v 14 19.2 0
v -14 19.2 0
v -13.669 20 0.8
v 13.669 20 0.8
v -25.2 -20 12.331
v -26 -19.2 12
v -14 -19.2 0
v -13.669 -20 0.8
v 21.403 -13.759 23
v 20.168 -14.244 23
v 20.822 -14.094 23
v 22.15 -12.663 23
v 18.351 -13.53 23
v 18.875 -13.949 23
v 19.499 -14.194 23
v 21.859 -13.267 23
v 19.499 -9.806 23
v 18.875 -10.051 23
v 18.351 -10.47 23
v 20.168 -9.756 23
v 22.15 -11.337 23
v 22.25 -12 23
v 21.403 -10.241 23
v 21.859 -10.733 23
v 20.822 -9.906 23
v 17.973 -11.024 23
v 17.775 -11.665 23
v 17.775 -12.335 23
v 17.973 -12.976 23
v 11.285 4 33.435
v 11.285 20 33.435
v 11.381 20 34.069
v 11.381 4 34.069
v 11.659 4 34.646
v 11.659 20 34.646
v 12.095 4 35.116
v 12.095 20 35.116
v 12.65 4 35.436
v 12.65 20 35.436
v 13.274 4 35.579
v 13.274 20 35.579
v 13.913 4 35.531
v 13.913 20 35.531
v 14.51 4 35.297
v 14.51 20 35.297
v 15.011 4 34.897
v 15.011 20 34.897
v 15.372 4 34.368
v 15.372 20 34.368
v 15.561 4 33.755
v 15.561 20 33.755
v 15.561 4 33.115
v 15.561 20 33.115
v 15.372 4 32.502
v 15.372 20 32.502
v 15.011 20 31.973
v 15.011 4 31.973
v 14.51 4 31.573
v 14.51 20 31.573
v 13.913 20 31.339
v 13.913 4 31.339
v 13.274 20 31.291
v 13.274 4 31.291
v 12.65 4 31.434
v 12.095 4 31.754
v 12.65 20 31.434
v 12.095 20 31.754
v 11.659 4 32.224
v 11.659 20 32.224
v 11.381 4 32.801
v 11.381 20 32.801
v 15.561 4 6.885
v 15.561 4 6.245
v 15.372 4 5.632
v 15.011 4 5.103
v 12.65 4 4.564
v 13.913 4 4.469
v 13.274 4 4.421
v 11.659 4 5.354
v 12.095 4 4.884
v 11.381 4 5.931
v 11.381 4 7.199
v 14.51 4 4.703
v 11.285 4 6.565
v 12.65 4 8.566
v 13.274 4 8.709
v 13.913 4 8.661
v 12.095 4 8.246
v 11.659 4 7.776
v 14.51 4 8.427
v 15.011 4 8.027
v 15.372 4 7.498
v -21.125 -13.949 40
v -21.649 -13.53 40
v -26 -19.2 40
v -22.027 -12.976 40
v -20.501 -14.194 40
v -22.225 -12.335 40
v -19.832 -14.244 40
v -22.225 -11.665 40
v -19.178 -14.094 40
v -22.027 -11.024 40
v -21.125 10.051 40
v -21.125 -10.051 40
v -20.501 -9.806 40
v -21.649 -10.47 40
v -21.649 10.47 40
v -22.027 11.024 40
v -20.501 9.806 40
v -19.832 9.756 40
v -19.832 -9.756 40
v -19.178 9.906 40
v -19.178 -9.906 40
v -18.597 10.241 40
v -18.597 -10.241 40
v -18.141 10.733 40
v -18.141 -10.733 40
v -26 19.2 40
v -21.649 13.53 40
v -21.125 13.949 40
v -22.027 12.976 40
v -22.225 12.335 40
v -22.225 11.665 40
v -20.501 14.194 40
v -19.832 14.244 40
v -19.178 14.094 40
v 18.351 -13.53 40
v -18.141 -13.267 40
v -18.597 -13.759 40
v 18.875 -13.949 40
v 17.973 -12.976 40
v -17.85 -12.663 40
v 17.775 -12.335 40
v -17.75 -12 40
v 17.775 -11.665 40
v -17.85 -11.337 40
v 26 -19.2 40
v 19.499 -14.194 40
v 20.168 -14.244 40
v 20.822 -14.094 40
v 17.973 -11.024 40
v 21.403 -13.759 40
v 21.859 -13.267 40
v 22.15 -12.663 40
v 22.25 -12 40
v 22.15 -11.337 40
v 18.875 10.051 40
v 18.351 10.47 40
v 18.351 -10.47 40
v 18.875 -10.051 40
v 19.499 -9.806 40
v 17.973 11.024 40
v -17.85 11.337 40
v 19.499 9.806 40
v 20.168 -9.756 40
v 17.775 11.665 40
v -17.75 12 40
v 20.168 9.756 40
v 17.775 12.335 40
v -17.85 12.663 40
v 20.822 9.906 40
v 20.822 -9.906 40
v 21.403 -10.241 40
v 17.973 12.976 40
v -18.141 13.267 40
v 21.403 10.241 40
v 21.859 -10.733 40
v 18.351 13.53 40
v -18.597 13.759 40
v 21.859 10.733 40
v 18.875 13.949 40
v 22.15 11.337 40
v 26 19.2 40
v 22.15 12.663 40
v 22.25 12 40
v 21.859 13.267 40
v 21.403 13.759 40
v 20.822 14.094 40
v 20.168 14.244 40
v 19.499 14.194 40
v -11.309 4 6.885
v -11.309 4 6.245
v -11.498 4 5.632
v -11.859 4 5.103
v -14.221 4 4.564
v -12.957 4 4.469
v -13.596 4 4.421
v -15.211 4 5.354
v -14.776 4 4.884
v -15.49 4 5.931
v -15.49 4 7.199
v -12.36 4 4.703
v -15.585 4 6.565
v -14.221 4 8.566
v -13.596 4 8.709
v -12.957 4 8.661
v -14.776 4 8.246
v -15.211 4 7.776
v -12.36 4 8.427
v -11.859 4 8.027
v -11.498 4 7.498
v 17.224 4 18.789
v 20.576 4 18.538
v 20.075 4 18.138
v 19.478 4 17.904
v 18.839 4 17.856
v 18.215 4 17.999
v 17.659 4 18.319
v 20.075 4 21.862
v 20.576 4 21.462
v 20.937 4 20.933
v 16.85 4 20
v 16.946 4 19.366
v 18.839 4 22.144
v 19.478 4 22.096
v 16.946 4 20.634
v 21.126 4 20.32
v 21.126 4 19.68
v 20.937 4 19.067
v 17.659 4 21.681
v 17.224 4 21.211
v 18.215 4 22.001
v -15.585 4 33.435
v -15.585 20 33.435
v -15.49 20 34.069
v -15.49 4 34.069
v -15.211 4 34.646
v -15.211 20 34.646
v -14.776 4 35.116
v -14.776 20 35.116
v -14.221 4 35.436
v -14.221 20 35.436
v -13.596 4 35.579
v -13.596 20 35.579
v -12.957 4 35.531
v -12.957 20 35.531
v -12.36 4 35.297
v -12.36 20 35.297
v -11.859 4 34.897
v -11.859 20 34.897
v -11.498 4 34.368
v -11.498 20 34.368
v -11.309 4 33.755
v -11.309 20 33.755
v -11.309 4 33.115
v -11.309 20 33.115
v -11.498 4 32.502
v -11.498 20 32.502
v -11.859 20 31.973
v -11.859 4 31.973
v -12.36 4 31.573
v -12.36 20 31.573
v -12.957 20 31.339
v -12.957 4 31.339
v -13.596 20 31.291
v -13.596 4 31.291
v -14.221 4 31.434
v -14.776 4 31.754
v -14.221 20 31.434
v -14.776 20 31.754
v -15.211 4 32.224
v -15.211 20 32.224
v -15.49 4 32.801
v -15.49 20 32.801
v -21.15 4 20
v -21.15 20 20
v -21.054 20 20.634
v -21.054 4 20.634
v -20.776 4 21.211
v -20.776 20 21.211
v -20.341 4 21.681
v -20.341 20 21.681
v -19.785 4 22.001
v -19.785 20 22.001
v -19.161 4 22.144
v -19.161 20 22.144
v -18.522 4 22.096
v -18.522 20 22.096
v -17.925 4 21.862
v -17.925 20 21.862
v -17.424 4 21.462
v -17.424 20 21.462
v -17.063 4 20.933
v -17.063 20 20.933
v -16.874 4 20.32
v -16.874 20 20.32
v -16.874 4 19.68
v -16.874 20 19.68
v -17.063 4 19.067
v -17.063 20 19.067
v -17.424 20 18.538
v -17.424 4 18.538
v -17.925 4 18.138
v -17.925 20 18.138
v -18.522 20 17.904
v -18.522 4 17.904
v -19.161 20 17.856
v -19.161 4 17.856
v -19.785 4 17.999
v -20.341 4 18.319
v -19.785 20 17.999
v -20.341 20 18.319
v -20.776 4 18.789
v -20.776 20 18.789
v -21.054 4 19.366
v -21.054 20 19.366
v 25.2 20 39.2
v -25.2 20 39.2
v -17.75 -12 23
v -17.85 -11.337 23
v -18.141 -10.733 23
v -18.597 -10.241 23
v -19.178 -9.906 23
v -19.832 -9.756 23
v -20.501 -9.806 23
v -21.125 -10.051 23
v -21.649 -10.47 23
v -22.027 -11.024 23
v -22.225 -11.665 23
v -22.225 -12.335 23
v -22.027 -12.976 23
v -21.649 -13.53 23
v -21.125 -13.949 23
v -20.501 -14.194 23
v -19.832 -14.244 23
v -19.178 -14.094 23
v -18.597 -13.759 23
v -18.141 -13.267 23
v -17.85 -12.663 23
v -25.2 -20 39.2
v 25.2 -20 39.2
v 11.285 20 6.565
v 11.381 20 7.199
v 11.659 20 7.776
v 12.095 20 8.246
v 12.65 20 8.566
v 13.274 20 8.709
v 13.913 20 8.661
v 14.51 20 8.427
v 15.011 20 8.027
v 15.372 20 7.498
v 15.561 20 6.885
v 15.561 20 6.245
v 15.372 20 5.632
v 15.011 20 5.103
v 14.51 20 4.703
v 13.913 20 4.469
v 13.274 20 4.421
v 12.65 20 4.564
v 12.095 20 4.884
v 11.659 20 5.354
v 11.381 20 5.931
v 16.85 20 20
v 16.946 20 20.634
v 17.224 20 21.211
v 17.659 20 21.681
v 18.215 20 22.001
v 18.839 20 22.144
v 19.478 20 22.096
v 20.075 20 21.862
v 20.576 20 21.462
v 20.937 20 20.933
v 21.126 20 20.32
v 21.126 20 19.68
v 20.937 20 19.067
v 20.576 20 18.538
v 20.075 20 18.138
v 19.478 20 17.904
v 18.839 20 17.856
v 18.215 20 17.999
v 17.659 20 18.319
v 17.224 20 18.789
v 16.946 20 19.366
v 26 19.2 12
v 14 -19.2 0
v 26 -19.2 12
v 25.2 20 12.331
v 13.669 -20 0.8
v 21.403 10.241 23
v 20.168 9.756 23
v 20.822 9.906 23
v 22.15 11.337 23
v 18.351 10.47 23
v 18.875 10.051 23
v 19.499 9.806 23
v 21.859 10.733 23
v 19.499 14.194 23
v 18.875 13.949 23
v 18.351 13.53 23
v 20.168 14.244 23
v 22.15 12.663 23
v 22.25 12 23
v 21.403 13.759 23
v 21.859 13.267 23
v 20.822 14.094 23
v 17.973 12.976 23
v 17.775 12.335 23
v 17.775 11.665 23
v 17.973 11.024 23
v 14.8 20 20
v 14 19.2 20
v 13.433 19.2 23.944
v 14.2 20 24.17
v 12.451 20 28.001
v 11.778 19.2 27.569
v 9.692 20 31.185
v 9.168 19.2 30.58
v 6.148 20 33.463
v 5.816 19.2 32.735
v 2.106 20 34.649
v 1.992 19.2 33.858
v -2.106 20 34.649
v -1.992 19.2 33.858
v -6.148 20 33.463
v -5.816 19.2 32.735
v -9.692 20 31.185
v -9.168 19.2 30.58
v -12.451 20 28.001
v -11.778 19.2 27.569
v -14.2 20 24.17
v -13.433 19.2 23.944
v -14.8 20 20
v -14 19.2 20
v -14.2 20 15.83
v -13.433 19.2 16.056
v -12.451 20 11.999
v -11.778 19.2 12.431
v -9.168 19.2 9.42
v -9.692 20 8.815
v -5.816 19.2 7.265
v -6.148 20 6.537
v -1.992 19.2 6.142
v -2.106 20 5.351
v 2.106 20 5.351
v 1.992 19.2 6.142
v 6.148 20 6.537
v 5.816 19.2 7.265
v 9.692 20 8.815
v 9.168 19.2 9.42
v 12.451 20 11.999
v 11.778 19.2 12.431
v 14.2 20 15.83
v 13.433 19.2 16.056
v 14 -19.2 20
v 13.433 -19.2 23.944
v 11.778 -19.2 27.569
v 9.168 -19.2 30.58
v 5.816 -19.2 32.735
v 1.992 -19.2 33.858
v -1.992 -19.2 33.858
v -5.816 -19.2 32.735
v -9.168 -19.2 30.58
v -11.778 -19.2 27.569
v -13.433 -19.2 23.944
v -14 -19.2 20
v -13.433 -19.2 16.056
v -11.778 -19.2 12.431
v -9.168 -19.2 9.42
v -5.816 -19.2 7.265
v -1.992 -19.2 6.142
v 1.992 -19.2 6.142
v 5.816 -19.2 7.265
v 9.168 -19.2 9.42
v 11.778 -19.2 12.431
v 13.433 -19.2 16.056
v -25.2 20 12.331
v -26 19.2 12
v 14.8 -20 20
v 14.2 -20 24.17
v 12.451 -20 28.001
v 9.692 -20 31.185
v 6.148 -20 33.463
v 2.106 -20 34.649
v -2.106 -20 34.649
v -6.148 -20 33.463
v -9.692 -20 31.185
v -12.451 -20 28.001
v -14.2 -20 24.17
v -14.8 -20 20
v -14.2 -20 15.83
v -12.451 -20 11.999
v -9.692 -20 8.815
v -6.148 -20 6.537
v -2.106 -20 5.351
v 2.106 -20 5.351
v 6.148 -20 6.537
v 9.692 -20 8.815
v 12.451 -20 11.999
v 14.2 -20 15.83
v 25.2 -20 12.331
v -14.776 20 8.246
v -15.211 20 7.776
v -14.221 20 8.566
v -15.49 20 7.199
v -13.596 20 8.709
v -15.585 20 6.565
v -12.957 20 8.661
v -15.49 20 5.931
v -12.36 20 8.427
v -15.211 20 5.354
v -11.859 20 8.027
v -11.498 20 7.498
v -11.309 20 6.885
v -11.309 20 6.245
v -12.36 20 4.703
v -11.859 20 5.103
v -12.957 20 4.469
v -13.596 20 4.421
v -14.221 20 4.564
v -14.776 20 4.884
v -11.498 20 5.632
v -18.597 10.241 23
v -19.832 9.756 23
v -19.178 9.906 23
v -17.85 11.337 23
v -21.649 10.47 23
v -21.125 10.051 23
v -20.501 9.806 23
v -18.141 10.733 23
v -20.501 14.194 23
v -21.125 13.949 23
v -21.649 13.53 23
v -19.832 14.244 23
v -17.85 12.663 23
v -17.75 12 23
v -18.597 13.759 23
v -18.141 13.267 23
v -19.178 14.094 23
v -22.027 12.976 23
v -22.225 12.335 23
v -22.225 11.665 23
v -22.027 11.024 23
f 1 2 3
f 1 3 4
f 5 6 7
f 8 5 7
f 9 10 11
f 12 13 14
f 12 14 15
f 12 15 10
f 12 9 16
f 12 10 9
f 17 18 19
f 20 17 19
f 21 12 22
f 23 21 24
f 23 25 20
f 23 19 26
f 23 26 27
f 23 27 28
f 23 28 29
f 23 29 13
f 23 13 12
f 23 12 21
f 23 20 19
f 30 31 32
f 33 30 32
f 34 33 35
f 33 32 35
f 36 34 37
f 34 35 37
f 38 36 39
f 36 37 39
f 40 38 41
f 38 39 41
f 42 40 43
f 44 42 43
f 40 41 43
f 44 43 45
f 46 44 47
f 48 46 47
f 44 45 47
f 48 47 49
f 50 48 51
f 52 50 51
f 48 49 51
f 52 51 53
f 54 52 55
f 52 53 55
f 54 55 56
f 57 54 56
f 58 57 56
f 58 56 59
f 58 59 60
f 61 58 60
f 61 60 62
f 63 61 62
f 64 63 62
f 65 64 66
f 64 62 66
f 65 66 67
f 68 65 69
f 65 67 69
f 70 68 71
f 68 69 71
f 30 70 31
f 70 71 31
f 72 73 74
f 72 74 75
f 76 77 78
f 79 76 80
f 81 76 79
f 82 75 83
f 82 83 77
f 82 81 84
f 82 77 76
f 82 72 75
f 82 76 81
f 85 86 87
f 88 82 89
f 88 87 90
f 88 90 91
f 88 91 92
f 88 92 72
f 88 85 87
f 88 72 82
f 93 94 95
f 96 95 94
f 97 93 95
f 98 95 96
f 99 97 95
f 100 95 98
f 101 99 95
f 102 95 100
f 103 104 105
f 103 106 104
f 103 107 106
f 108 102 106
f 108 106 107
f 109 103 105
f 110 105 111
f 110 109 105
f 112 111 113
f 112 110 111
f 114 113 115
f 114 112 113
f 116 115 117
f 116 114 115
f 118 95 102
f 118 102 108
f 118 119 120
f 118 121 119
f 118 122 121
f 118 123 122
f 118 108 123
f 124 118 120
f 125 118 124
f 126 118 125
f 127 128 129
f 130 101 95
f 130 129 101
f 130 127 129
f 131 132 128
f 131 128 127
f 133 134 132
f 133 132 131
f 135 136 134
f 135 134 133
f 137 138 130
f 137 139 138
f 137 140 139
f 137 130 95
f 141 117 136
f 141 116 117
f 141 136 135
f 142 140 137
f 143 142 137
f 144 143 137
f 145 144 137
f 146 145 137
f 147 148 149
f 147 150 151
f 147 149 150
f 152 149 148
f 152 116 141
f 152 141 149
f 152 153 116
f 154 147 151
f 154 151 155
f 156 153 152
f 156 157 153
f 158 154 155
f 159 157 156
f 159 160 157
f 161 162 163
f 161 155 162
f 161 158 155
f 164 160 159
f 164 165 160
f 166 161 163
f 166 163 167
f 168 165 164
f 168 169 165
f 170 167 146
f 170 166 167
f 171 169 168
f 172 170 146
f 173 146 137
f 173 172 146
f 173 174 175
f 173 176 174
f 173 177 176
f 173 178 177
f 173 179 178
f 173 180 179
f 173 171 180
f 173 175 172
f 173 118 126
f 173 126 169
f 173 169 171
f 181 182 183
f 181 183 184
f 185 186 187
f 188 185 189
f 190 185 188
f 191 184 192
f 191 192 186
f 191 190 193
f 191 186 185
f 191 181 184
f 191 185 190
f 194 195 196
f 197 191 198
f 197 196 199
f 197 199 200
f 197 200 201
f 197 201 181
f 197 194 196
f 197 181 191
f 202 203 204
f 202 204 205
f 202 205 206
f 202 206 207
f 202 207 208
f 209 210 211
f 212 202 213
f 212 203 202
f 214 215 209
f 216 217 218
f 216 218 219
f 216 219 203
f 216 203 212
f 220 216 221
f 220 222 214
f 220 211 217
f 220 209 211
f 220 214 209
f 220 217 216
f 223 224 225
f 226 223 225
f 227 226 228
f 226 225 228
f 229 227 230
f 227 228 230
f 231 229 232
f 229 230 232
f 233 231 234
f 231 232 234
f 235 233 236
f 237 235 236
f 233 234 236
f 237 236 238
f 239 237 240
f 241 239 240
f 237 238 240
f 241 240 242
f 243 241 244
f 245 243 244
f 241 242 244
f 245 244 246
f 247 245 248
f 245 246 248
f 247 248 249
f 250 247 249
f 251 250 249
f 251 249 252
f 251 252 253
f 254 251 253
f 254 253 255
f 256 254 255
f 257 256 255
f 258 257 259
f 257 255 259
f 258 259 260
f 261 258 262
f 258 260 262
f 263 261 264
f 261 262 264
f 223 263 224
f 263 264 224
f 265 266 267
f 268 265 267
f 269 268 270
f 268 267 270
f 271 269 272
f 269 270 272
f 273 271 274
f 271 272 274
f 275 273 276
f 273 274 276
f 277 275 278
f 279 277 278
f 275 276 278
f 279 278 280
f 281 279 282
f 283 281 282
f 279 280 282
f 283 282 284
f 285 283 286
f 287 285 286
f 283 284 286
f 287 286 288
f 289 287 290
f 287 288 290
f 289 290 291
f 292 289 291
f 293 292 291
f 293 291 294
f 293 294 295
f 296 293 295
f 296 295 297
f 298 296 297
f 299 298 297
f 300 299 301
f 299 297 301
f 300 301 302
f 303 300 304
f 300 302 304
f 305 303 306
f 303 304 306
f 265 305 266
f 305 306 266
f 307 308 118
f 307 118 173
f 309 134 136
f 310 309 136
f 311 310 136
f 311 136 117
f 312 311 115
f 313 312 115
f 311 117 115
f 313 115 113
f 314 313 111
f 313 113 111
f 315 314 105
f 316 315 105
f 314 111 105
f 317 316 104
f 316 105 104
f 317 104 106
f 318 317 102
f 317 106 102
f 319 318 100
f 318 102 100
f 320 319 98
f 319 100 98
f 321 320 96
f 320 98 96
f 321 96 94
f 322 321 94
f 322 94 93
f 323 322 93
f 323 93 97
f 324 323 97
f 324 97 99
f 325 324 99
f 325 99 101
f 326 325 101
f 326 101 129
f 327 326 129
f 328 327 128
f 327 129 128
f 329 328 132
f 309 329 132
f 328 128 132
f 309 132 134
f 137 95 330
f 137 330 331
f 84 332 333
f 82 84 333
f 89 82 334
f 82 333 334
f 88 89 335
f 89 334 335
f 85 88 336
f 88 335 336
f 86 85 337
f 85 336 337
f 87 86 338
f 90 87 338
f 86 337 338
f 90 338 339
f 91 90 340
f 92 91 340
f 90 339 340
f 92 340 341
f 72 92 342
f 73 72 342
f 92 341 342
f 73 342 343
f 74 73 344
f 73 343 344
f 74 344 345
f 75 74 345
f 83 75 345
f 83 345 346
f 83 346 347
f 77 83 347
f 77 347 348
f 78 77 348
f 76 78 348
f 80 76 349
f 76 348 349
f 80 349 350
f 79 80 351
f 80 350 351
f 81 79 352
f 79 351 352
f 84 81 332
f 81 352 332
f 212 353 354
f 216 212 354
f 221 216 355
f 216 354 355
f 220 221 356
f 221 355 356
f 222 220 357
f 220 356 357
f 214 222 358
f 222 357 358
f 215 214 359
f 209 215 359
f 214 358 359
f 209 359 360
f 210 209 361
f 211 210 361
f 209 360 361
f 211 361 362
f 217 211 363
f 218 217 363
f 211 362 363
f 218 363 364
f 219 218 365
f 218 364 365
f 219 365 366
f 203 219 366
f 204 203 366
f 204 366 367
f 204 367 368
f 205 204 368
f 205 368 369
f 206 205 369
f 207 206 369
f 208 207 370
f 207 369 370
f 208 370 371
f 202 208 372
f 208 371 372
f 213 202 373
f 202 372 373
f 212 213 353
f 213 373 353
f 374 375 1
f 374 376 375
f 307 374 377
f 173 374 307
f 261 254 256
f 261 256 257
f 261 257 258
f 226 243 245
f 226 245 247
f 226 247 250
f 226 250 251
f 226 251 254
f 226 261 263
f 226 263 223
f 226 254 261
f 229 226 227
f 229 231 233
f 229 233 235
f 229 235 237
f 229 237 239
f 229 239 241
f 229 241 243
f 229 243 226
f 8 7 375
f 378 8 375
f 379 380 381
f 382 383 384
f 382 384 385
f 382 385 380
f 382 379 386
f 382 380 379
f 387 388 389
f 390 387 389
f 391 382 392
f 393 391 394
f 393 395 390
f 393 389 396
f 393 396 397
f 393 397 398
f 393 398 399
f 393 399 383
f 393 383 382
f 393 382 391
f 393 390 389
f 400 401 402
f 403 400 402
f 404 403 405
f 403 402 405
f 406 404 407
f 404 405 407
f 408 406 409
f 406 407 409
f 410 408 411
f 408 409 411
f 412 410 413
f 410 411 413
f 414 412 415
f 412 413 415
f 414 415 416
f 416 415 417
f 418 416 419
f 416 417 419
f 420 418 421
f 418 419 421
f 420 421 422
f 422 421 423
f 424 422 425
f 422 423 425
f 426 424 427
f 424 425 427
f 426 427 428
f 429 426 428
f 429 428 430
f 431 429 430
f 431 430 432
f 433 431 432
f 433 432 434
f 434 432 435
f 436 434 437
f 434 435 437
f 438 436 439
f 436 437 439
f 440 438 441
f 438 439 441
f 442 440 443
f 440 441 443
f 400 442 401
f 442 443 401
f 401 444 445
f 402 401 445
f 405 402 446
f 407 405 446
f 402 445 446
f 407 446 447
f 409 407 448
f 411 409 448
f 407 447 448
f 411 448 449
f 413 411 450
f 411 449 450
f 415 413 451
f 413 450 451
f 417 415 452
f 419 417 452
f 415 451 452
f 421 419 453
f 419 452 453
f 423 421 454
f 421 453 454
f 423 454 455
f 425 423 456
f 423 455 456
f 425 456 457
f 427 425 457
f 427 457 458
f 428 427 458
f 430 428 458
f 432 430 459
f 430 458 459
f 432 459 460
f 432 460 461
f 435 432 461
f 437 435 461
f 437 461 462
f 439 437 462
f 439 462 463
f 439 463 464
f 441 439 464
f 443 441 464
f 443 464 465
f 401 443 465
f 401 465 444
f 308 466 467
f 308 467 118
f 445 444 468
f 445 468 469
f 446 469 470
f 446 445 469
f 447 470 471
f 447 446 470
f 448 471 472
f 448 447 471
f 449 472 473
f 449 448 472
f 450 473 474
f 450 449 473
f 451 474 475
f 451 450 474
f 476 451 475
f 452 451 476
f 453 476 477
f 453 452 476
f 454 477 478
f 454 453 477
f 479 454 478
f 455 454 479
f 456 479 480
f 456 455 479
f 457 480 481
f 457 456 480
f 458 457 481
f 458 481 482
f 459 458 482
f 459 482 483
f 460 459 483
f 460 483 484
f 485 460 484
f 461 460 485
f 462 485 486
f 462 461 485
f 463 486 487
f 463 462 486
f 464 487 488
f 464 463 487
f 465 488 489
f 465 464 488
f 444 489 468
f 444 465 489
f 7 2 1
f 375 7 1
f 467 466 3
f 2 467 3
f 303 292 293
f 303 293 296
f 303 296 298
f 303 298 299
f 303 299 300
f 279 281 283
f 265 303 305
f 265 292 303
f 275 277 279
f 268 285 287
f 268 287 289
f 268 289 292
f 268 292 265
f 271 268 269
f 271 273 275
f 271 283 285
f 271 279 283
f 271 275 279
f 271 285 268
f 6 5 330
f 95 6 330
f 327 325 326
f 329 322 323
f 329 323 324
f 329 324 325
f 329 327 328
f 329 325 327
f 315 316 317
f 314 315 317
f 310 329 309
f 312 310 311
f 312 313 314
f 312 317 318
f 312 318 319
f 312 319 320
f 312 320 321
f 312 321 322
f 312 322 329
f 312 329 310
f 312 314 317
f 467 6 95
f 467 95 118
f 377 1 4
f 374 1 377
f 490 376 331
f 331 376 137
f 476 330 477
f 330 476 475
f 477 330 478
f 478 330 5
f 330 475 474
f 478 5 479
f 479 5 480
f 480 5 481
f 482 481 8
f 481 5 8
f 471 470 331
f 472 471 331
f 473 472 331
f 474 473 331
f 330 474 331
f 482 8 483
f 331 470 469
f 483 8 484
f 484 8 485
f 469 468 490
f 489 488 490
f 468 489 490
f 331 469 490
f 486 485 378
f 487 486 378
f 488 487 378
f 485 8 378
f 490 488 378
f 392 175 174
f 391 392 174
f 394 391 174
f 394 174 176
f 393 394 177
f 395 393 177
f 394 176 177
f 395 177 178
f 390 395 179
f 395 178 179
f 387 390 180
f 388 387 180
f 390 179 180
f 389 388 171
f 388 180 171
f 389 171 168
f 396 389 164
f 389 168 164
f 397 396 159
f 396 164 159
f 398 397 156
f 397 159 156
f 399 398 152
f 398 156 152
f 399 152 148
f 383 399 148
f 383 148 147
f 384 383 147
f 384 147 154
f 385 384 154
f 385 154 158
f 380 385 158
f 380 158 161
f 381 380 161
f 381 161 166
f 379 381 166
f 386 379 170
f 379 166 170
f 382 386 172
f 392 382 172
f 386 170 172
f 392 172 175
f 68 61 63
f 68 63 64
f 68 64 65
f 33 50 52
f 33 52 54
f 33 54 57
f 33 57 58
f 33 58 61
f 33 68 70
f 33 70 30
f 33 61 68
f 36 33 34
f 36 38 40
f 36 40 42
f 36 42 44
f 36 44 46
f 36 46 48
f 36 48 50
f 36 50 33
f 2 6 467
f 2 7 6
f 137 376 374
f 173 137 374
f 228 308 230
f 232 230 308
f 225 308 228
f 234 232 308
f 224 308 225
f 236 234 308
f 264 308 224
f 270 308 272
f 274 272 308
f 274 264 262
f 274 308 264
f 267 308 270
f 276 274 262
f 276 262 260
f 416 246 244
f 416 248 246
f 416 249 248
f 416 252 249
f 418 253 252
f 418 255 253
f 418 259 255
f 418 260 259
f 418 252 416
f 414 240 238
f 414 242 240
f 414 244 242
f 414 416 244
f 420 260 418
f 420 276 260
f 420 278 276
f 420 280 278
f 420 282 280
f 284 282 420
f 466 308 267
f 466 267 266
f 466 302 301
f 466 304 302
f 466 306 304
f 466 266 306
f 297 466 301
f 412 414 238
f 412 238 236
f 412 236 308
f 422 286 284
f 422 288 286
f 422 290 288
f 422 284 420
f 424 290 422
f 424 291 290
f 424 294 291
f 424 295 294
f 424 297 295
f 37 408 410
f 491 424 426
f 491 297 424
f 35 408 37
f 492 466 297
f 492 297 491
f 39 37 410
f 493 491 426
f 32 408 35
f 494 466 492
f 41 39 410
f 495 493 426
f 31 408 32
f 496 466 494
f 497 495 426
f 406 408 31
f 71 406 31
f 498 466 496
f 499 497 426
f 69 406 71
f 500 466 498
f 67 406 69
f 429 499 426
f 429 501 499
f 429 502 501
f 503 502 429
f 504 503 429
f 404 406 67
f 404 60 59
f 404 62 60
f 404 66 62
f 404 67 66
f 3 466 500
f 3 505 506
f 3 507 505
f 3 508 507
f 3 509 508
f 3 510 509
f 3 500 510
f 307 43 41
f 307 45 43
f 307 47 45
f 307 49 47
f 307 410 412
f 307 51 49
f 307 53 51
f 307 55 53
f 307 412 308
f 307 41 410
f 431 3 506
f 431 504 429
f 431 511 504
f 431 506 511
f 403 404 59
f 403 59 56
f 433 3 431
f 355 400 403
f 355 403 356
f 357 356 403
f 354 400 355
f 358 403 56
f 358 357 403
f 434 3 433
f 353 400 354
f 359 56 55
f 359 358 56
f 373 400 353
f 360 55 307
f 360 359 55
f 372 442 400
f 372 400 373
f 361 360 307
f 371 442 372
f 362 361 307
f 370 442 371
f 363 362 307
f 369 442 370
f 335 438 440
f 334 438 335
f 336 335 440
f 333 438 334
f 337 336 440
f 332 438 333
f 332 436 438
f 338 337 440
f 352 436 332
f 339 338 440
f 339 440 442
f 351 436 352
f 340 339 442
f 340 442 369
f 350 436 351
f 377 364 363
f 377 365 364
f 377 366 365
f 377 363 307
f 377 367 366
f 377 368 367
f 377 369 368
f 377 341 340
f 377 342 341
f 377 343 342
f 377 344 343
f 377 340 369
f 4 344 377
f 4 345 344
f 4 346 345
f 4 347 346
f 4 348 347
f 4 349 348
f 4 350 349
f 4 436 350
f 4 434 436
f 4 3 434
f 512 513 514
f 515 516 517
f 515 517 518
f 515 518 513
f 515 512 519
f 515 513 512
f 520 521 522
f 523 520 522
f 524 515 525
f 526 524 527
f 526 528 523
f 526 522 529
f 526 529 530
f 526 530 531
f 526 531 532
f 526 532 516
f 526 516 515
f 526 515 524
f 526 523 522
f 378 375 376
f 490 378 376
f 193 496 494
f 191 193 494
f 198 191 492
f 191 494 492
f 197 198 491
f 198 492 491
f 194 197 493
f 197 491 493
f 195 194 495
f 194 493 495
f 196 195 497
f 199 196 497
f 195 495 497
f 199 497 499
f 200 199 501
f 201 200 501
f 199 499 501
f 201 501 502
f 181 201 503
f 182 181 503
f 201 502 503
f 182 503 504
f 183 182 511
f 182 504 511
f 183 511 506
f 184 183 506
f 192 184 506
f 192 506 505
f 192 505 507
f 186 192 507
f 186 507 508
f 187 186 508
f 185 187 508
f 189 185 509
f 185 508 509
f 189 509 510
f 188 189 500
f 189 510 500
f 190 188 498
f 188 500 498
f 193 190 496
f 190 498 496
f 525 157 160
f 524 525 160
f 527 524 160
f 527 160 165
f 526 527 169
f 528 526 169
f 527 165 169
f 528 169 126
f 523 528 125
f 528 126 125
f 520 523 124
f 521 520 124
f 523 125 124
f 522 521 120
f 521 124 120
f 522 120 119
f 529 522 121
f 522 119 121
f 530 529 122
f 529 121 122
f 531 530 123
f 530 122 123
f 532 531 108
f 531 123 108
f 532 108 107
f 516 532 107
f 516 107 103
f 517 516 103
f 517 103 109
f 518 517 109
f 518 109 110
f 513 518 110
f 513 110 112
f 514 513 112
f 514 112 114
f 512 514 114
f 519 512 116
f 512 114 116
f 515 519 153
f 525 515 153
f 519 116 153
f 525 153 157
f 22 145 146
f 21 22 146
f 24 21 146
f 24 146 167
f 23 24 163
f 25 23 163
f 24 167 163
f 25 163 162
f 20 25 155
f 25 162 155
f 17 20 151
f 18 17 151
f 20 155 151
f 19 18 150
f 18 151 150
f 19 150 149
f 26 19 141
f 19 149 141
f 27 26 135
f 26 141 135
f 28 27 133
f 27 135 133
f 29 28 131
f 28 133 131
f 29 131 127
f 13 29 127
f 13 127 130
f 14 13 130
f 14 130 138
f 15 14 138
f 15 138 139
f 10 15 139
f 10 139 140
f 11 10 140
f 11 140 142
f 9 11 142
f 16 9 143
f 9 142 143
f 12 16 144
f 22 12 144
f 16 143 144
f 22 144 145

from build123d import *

# Parameters (mm, degrees)
F0_W     = 52
F0_H     = 40
F1_DEPTH = 40
F2_R     = 14
F3_DEPTH = 40.001
F4_R     = 2.25
F5_DEPTH = 17
F6_R     = 2.15
F7_DEPTH = 16
F8_SIZE  = 12
F9_SIZE  = 0.8


with BuildPart() as f1:
    # F0 (on Top) → F1 (new body)
    with BuildSketch(Plane.XY):
        Rectangle(F0_W, F0_H)
    extrude(amount=F1_DEPTH)

    # F2 (on face) → F3 (cut, through all)
    with BuildSketch(Plane.XZ.offset(20)):
        with Locations((0, 20)):
            Circle(F2_R)
    extrude(amount=-F3_DEPTH, mode=Mode.SUBTRACT)

    # F4 (on face) → F5 (cut)
    with BuildSketch(Plane.XY.offset(40)):
        with Locations((-20, 12)):
            Circle(F4_R)
        with Locations((-20, -12)):
            Circle(F4_R)
        with Locations((20, -12)):
            Circle(F4_R)
        with Locations((20, 12)):
            Circle(F4_R)
    extrude(amount=-F5_DEPTH, mode=Mode.SUBTRACT)

    # F6 (on face) → F7 (cut)
    with BuildSketch(Plane(origin=(0, 20, 0), x_dir=(-1, 0, 0), z_dir=(0, 1, 0))):
        with Locations((13.4350288425, 33.4350288425)):
            Circle(F6_R)
        with Locations((19, 20)):
            Circle(F6_R)
        with Locations((-13.4350288425, 33.4350288425)):
            Circle(F6_R)
        with Locations((-19, 20)):
            Circle(F6_R)
        with Locations((13.4350288425, 6.5649711575)):
            Circle(F6_R)
        with Locations((-13.4350288425, 6.5649711575)):
            Circle(F6_R)
    extrude(amount=-F7_DEPTH, mode=Mode.SUBTRACT)

    # F8
    f8_edges = [f1.edges().sort_by_distance(p)[0] for p in [
        (-26, 0, 0),
        (26, 0, 0),
    ]]
    chamfer(f8_edges, length=F8_SIZE)

    # F9
    f9_edges = [f1.edges().sort_by_distance(p)[0] for p in [
        (-26, 20, 26),
        (-20, 20, 6),
        (0, 20, 0),
        (20, 20, 6),
        (26, 20, 26),
        (0, 20, 40),
        (-26, -20, 26),
        (-20, -20, 6),
        (0, -20, 40),
        (0, -20, 0),
        (26, -20, 26),
        (20, -20, 6),
        (-14, -20, 20),
        (-14, 20, 20),
    ]]
    chamfer(f9_edges, length=F9_SIZE)


solid = f1.part
